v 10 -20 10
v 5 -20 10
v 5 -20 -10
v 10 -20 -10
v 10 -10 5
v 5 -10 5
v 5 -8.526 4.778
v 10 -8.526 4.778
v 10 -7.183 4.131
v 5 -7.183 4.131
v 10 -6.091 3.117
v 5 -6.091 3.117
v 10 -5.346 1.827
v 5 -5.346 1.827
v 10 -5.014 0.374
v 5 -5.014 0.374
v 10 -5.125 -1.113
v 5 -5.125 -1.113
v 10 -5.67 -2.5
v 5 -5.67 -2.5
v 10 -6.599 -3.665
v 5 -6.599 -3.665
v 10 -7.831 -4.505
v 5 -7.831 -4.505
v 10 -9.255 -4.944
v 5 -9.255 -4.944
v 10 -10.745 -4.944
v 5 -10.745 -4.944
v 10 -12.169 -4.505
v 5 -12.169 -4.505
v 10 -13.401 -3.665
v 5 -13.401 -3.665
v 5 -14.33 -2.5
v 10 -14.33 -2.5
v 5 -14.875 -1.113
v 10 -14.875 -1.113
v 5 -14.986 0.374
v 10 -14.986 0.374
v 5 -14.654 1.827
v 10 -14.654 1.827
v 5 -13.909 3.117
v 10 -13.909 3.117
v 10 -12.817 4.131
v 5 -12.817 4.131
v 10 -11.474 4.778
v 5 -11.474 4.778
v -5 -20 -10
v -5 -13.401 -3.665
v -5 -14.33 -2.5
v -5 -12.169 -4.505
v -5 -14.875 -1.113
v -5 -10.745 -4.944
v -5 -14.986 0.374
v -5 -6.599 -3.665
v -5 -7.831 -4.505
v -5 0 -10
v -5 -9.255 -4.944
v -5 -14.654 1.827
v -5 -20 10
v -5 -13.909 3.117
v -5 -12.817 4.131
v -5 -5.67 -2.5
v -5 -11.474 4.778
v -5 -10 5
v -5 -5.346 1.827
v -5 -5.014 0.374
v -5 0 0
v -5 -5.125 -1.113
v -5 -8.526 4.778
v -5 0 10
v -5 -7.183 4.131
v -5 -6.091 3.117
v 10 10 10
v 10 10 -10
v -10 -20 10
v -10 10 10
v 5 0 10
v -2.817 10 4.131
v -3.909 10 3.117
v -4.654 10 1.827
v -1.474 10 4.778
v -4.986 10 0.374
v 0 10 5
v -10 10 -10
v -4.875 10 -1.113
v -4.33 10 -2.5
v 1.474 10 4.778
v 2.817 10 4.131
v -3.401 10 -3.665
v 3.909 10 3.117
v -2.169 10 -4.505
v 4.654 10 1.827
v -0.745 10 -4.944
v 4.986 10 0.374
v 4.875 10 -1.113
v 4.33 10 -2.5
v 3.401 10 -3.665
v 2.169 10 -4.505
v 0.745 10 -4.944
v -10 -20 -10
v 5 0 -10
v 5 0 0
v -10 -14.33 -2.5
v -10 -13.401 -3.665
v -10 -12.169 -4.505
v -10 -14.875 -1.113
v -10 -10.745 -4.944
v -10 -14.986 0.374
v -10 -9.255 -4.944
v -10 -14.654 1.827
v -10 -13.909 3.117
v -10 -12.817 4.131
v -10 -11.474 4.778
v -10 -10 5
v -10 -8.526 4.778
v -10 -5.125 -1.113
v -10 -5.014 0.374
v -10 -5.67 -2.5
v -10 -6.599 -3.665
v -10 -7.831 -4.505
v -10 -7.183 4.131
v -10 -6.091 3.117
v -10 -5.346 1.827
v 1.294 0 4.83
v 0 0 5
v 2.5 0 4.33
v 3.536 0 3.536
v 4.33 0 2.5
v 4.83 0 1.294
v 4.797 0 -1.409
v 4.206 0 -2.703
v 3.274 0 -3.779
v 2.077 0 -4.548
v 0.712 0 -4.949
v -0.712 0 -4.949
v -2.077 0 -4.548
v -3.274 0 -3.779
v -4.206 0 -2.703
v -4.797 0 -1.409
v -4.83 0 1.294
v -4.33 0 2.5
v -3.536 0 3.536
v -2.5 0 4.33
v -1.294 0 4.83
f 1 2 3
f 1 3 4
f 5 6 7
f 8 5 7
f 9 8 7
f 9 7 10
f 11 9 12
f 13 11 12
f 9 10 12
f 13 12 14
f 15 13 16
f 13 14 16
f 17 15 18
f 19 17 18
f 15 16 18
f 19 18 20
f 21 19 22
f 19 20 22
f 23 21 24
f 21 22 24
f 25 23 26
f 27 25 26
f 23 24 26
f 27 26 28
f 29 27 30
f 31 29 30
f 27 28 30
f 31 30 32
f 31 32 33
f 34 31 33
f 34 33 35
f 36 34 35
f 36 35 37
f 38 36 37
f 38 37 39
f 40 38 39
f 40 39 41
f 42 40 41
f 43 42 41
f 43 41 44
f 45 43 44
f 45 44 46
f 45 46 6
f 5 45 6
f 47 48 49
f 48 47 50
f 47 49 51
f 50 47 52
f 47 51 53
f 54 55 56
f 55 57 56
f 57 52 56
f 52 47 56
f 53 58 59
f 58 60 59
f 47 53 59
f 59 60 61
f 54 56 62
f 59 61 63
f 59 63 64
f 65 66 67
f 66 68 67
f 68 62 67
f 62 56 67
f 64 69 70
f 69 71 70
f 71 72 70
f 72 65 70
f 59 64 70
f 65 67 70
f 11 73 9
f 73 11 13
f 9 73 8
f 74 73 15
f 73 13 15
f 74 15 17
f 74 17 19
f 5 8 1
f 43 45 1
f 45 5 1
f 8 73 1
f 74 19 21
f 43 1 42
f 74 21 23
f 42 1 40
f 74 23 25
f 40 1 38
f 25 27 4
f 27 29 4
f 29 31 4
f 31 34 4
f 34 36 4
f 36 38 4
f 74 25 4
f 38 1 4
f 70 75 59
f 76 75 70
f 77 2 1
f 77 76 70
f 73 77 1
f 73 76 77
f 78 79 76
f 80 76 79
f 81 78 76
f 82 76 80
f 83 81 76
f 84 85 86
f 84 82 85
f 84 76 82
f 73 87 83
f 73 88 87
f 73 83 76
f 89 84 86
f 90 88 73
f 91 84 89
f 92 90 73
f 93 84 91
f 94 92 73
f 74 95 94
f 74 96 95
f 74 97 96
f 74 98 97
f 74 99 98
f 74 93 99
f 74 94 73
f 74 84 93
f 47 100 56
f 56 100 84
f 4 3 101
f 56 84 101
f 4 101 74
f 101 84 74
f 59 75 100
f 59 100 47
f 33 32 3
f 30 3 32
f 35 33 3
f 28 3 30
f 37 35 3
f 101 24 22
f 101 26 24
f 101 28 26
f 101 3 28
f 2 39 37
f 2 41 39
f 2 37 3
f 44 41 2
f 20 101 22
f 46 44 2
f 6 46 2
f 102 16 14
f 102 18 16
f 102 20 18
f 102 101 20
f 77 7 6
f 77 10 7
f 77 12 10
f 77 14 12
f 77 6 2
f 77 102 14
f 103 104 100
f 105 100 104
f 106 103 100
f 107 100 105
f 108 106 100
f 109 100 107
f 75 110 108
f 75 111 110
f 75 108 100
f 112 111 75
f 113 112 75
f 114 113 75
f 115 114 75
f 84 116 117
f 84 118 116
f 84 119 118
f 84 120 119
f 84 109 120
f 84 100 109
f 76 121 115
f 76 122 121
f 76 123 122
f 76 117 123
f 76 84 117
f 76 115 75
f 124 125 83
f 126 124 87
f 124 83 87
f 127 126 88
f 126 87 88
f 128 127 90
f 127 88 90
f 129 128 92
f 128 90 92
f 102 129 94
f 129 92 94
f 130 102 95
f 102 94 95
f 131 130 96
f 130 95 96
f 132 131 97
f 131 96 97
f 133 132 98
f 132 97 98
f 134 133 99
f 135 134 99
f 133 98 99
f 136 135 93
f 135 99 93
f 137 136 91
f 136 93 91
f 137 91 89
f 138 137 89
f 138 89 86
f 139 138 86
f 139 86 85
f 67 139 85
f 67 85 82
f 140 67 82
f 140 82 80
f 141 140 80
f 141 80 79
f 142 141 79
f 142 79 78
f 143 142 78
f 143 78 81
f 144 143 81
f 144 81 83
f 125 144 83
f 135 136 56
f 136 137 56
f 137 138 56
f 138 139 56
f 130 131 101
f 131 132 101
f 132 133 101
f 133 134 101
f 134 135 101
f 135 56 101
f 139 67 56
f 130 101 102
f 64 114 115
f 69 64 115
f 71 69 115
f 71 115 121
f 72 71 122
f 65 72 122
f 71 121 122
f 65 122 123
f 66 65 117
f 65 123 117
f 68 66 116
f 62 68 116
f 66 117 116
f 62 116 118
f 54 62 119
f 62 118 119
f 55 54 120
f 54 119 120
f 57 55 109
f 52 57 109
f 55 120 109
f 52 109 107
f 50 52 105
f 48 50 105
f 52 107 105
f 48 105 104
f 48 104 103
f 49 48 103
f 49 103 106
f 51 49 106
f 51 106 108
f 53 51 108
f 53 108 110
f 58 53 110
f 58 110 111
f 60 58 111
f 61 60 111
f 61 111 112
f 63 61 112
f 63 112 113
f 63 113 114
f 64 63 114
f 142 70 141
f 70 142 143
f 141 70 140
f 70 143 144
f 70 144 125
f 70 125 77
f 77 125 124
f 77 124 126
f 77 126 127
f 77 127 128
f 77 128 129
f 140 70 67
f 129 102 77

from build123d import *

# Parameters (mm, degrees)
SKETCH_1_W          = 20
SKETCH_1_H          = 20
EXTRUDE_1_DEPTH     = 10
SKETCH_2_R          = 5
CUT_EXTRUDE_2_DEPTH = 18.320508076
SKETCH_3_W          = 5
SKETCH_3_H          = 20
EXTRUDE_2_DEPTH     = 20
SKETCH_4_R          = 5
CUT_EXTRUDE_3_DEPTH = 31


with BuildPart() as part:
    # 草图1 → 凸台-拉伸1 (new body)
    with BuildSketch(Plane(origin=(0, 0, 0), x_dir=(1, 0, 0), z_dir=(0, 1, 0))):
        Rectangle(SKETCH_1_W, SKETCH_1_H)
    extrude(amount=EXTRUDE_1_DEPTH)

    # 草图2 → 切除-拉伸2 (cut, through all)
    with BuildSketch(Plane(origin=(0, 10, 0), x_dir=(1, 0, 0), z_dir=(0, 1, 0))):
        with Locations(Location((0, 0, 0), (0, 0, 270))):
            Circle(SKETCH_2_R)
    extrude(amount=-CUT_EXTRUDE_2_DEPTH, mode=Mode.SUBTRACT)

    # 草图3 → 凸台-拉伸2 (add)
    with BuildSketch(Plane.XZ):
        with Locations((-7.5, 0)):
            Rectangle(SKETCH_3_W, SKETCH_3_H)
        with Locations((7.5, 0)):
            Rectangle(SKETCH_3_W, SKETCH_3_H)
    extrude(amount=EXTRUDE_2_DEPTH)

    # 草图4 → 切除-拉伸3 (cut, through all)
    with BuildSketch(Plane.ZY.offset(10)):
        with Locations((0, -10)):
            Circle(SKETCH_4_R)
    extrude(amount=-CUT_EXTRUDE_3_DEPTH, mode=Mode.SUBTRACT)


solid = part.part
